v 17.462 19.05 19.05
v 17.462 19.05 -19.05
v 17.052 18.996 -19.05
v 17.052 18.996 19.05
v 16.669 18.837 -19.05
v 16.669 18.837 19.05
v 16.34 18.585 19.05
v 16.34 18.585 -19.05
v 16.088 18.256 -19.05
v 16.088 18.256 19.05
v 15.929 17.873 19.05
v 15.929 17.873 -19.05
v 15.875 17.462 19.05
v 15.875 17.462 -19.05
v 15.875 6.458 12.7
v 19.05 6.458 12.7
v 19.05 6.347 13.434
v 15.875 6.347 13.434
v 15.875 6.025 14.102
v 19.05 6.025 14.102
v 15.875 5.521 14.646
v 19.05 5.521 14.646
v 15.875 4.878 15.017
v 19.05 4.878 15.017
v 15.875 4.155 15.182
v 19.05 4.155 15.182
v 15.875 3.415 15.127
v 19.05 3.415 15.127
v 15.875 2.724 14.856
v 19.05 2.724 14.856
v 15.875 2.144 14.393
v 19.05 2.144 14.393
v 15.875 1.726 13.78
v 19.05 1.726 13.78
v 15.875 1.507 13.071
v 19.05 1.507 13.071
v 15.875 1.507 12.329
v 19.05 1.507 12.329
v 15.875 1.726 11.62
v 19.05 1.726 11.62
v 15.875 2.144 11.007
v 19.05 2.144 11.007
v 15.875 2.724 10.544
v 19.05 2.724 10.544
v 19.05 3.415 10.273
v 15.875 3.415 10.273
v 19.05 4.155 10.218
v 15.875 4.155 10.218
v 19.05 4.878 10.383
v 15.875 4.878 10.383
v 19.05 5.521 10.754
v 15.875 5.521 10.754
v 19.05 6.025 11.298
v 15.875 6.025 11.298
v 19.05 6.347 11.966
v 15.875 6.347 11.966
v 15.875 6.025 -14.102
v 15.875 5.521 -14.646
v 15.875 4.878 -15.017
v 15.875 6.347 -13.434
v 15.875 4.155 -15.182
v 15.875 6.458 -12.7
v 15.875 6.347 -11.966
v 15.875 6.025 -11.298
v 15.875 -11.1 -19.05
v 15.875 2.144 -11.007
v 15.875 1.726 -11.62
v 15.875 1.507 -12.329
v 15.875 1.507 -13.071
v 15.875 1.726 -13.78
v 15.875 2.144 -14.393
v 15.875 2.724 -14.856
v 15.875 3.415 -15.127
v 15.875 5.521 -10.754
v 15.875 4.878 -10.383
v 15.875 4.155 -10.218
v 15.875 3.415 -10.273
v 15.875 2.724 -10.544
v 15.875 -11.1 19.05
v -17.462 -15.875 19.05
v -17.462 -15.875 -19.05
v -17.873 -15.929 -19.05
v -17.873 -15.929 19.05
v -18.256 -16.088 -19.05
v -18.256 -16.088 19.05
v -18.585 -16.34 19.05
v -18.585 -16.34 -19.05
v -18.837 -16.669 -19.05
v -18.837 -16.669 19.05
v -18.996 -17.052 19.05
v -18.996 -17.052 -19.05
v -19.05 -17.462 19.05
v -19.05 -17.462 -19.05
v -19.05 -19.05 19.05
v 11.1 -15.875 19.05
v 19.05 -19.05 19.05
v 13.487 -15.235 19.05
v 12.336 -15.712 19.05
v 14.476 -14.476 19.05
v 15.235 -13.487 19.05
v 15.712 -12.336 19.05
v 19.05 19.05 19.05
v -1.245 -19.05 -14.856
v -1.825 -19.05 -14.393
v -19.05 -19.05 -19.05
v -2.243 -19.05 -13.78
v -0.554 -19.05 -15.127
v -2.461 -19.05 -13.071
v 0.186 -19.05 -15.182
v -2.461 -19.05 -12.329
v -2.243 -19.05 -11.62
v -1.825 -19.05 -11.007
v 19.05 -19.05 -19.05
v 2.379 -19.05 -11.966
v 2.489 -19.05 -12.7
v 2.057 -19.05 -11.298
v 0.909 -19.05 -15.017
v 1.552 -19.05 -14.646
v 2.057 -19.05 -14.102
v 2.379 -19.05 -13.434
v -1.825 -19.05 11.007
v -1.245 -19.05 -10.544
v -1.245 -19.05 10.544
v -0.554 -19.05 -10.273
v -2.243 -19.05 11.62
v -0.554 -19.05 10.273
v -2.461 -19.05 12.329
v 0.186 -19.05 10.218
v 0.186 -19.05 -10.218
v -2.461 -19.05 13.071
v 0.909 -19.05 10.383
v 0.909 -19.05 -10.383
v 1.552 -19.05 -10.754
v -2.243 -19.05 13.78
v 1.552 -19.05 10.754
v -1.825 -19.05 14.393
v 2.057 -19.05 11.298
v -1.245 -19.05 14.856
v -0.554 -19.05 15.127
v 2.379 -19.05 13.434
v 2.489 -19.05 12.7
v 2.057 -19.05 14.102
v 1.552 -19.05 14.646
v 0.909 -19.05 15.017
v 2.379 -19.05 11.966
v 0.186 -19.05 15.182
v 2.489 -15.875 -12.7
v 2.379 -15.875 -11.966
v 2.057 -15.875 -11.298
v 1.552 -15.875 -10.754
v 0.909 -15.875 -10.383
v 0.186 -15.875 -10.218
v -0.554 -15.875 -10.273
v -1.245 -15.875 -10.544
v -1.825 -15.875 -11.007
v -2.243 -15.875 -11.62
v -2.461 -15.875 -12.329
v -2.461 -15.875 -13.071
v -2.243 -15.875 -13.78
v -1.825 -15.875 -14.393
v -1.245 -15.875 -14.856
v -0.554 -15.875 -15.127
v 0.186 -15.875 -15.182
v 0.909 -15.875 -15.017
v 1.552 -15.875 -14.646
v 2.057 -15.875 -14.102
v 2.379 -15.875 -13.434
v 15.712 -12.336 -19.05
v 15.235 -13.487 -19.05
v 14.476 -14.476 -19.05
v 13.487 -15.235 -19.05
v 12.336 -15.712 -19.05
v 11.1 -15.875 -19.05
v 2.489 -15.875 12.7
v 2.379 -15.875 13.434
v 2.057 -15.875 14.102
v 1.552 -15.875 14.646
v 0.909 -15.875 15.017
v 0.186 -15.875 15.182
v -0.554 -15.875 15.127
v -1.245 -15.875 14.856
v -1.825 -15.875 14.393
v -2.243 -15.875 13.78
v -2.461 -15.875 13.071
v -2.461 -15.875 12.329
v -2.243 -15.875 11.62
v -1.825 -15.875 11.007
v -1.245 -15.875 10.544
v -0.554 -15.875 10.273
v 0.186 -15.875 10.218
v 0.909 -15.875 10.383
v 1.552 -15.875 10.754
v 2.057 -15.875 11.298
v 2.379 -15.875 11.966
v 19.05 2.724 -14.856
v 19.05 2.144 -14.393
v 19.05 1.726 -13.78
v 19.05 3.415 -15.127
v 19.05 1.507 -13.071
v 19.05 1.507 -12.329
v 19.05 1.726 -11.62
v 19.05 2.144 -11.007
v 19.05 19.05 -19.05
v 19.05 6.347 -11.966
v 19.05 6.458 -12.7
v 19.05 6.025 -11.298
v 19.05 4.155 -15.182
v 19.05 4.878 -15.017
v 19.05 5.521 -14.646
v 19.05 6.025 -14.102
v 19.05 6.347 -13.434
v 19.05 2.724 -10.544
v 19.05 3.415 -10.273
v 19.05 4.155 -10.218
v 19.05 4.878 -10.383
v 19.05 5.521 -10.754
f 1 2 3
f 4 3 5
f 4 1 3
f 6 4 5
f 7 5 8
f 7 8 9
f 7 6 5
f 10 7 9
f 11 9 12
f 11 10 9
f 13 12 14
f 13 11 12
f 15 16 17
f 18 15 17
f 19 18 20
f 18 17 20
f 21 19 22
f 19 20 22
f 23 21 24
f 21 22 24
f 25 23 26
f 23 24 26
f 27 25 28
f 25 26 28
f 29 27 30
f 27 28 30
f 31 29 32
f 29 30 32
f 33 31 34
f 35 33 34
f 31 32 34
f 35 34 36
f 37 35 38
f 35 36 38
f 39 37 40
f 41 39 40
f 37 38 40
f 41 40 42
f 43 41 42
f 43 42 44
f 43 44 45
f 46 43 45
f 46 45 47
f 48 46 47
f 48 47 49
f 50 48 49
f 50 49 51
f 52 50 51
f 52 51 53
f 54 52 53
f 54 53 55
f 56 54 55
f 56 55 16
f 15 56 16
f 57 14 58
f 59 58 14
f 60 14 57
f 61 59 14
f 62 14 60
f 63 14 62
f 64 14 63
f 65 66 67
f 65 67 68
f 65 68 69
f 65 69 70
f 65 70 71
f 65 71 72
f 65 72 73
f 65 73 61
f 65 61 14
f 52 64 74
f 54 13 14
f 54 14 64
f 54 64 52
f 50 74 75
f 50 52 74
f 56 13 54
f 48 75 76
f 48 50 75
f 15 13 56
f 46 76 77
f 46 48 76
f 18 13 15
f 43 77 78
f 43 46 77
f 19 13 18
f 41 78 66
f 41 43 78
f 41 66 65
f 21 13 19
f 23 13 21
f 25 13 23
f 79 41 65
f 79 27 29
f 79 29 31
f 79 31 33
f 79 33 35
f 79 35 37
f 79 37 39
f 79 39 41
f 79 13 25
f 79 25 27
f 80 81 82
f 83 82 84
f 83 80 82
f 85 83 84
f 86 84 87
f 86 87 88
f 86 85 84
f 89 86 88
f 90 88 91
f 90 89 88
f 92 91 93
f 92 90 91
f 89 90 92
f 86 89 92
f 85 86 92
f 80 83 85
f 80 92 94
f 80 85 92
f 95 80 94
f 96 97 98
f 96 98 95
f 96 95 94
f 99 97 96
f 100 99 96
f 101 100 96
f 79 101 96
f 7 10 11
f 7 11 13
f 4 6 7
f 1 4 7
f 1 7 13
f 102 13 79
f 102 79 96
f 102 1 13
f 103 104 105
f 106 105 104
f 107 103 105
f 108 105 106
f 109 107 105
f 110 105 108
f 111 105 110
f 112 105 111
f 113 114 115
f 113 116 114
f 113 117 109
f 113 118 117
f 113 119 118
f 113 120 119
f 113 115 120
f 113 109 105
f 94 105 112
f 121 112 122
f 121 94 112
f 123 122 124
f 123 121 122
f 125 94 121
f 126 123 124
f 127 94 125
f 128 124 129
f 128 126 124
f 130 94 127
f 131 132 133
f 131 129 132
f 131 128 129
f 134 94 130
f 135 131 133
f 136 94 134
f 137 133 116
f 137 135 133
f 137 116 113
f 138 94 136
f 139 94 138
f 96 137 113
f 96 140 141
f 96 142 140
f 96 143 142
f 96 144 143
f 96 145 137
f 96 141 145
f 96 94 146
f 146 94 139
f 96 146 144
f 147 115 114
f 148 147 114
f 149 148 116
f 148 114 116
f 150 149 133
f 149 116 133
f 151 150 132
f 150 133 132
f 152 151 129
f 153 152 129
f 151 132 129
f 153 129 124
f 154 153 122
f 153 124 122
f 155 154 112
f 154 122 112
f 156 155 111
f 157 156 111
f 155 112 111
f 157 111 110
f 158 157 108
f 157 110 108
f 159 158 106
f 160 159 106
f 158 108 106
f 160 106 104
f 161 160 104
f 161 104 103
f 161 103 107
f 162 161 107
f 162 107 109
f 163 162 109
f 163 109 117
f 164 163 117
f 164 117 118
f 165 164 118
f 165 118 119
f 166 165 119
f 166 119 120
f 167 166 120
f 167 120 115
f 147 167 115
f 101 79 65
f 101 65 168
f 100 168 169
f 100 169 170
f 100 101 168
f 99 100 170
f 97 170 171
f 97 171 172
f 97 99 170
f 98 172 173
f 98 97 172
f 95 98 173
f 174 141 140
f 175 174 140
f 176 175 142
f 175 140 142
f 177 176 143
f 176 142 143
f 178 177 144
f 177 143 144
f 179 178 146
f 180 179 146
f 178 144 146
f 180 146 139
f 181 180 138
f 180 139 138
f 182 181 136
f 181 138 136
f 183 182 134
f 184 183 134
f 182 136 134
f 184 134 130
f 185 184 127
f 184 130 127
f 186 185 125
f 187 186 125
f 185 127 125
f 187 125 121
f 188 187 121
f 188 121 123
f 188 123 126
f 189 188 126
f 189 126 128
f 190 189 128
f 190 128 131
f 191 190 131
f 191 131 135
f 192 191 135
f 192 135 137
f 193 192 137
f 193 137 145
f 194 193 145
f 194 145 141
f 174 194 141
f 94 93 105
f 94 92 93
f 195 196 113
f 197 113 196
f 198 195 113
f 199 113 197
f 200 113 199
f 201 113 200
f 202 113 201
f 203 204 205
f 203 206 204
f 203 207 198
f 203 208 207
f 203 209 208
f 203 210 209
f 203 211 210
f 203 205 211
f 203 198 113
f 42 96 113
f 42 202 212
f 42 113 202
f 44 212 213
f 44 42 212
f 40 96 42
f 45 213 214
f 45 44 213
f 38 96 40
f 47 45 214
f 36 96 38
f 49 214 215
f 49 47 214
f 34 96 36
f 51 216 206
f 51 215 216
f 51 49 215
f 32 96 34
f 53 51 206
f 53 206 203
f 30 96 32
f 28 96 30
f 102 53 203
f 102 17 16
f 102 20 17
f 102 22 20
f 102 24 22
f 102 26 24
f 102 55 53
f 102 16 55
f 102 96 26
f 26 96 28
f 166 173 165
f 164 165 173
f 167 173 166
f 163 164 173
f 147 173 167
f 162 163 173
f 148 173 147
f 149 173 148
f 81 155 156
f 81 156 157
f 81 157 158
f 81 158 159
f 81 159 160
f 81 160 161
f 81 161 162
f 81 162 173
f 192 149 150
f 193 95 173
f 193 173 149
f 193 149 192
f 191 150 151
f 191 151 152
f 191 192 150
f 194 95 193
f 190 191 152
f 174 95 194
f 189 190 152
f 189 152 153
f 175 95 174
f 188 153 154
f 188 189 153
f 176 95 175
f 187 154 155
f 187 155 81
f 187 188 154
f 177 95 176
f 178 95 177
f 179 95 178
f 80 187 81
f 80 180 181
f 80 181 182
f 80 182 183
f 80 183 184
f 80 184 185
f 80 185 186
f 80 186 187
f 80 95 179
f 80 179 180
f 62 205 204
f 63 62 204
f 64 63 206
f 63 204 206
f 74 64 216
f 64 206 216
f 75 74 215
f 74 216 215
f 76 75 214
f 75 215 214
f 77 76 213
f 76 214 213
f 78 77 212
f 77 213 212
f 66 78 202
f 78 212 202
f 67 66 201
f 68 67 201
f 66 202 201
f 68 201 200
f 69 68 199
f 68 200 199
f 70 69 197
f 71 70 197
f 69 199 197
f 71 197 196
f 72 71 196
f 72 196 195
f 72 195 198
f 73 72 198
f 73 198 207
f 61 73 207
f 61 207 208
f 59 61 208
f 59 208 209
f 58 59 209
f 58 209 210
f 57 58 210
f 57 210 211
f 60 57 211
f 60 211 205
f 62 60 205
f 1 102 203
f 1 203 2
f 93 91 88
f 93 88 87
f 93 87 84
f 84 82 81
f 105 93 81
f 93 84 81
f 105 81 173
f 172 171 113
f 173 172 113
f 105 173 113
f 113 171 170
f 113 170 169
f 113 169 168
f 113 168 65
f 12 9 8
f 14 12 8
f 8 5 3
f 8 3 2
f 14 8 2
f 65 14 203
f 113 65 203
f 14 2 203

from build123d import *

# Parameters (mm, degrees)
BOSS_EXTRUDE1_DEPTH = 19.05
SKETCH3_R           = 2.4892
CUT_EXTRUDE1_DEPTH  = 47.6627796
SKETCH4_R           = 2.4892
CUT_EXTRUDE2_DEPTH  = 47.6627796


with BuildPart() as part:
    # Sketch2 → Boss-Extrude1 (new, symmetric)
    with BuildSketch(Plane.XY):
        with BuildLine():
            Line((-19.05, -19.05), (19.05, -19.05))
            Line((19.05, -19.05), (19.05, 19.05))
            Line((19.05, 19.05), (17.4625, 19.05))
            ThreePointArc((17.4625, 19.05), (16.339967985, 18.585032015), (15.875, 17.4625))
            Line((15.875, 17.4625), (15.875, -11.0998))
            ThreePointArc((15.875, -11.0998), (14.476376302, -14.476376302), (11.0998, -15.875))
            Line((11.0998, -15.875), (-17.4625, -15.875))
            ThreePointArc((-17.4625, -15.875), (-18.585032015, -16.339967985), (-19.05, -17.4625))
            Line((-19.05, -17.4625), (-19.05, -19.05))
        make_face()
    extrude(amount=BOSS_EXTRUDE1_DEPTH, both=True)

    # Sketch3 → Cut-Extrude1 (cut, through all)
    with BuildSketch(Plane(origin=(19.05, 0, 0), x_dir=(0, 0, -1), z_dir=(1, 0, 0))):
        with Locations(Location((-12.7, 3.96875, 0), (0, 0, 90))):
            Circle(SKETCH3_R)
        with Locations(Location((12.7, 3.96875, 0), (0, 0, 90))):
            Circle(SKETCH3_R)
    extrude(amount=-CUT_EXTRUDE1_DEPTH, mode=Mode.SUBTRACT)

    # Sketch4 → Cut-Extrude2 (cut, through all)
    with BuildSketch(Plane.XZ.offset(19.05)):
        with Locations((0, 12.7)):
            Circle(SKETCH4_R)
        with Locations((0, -12.7)):
            Circle(SKETCH4_R)
    extrude(amount=-CUT_EXTRUDE2_DEPTH, mode=Mode.SUBTRACT)


solid = part.part
